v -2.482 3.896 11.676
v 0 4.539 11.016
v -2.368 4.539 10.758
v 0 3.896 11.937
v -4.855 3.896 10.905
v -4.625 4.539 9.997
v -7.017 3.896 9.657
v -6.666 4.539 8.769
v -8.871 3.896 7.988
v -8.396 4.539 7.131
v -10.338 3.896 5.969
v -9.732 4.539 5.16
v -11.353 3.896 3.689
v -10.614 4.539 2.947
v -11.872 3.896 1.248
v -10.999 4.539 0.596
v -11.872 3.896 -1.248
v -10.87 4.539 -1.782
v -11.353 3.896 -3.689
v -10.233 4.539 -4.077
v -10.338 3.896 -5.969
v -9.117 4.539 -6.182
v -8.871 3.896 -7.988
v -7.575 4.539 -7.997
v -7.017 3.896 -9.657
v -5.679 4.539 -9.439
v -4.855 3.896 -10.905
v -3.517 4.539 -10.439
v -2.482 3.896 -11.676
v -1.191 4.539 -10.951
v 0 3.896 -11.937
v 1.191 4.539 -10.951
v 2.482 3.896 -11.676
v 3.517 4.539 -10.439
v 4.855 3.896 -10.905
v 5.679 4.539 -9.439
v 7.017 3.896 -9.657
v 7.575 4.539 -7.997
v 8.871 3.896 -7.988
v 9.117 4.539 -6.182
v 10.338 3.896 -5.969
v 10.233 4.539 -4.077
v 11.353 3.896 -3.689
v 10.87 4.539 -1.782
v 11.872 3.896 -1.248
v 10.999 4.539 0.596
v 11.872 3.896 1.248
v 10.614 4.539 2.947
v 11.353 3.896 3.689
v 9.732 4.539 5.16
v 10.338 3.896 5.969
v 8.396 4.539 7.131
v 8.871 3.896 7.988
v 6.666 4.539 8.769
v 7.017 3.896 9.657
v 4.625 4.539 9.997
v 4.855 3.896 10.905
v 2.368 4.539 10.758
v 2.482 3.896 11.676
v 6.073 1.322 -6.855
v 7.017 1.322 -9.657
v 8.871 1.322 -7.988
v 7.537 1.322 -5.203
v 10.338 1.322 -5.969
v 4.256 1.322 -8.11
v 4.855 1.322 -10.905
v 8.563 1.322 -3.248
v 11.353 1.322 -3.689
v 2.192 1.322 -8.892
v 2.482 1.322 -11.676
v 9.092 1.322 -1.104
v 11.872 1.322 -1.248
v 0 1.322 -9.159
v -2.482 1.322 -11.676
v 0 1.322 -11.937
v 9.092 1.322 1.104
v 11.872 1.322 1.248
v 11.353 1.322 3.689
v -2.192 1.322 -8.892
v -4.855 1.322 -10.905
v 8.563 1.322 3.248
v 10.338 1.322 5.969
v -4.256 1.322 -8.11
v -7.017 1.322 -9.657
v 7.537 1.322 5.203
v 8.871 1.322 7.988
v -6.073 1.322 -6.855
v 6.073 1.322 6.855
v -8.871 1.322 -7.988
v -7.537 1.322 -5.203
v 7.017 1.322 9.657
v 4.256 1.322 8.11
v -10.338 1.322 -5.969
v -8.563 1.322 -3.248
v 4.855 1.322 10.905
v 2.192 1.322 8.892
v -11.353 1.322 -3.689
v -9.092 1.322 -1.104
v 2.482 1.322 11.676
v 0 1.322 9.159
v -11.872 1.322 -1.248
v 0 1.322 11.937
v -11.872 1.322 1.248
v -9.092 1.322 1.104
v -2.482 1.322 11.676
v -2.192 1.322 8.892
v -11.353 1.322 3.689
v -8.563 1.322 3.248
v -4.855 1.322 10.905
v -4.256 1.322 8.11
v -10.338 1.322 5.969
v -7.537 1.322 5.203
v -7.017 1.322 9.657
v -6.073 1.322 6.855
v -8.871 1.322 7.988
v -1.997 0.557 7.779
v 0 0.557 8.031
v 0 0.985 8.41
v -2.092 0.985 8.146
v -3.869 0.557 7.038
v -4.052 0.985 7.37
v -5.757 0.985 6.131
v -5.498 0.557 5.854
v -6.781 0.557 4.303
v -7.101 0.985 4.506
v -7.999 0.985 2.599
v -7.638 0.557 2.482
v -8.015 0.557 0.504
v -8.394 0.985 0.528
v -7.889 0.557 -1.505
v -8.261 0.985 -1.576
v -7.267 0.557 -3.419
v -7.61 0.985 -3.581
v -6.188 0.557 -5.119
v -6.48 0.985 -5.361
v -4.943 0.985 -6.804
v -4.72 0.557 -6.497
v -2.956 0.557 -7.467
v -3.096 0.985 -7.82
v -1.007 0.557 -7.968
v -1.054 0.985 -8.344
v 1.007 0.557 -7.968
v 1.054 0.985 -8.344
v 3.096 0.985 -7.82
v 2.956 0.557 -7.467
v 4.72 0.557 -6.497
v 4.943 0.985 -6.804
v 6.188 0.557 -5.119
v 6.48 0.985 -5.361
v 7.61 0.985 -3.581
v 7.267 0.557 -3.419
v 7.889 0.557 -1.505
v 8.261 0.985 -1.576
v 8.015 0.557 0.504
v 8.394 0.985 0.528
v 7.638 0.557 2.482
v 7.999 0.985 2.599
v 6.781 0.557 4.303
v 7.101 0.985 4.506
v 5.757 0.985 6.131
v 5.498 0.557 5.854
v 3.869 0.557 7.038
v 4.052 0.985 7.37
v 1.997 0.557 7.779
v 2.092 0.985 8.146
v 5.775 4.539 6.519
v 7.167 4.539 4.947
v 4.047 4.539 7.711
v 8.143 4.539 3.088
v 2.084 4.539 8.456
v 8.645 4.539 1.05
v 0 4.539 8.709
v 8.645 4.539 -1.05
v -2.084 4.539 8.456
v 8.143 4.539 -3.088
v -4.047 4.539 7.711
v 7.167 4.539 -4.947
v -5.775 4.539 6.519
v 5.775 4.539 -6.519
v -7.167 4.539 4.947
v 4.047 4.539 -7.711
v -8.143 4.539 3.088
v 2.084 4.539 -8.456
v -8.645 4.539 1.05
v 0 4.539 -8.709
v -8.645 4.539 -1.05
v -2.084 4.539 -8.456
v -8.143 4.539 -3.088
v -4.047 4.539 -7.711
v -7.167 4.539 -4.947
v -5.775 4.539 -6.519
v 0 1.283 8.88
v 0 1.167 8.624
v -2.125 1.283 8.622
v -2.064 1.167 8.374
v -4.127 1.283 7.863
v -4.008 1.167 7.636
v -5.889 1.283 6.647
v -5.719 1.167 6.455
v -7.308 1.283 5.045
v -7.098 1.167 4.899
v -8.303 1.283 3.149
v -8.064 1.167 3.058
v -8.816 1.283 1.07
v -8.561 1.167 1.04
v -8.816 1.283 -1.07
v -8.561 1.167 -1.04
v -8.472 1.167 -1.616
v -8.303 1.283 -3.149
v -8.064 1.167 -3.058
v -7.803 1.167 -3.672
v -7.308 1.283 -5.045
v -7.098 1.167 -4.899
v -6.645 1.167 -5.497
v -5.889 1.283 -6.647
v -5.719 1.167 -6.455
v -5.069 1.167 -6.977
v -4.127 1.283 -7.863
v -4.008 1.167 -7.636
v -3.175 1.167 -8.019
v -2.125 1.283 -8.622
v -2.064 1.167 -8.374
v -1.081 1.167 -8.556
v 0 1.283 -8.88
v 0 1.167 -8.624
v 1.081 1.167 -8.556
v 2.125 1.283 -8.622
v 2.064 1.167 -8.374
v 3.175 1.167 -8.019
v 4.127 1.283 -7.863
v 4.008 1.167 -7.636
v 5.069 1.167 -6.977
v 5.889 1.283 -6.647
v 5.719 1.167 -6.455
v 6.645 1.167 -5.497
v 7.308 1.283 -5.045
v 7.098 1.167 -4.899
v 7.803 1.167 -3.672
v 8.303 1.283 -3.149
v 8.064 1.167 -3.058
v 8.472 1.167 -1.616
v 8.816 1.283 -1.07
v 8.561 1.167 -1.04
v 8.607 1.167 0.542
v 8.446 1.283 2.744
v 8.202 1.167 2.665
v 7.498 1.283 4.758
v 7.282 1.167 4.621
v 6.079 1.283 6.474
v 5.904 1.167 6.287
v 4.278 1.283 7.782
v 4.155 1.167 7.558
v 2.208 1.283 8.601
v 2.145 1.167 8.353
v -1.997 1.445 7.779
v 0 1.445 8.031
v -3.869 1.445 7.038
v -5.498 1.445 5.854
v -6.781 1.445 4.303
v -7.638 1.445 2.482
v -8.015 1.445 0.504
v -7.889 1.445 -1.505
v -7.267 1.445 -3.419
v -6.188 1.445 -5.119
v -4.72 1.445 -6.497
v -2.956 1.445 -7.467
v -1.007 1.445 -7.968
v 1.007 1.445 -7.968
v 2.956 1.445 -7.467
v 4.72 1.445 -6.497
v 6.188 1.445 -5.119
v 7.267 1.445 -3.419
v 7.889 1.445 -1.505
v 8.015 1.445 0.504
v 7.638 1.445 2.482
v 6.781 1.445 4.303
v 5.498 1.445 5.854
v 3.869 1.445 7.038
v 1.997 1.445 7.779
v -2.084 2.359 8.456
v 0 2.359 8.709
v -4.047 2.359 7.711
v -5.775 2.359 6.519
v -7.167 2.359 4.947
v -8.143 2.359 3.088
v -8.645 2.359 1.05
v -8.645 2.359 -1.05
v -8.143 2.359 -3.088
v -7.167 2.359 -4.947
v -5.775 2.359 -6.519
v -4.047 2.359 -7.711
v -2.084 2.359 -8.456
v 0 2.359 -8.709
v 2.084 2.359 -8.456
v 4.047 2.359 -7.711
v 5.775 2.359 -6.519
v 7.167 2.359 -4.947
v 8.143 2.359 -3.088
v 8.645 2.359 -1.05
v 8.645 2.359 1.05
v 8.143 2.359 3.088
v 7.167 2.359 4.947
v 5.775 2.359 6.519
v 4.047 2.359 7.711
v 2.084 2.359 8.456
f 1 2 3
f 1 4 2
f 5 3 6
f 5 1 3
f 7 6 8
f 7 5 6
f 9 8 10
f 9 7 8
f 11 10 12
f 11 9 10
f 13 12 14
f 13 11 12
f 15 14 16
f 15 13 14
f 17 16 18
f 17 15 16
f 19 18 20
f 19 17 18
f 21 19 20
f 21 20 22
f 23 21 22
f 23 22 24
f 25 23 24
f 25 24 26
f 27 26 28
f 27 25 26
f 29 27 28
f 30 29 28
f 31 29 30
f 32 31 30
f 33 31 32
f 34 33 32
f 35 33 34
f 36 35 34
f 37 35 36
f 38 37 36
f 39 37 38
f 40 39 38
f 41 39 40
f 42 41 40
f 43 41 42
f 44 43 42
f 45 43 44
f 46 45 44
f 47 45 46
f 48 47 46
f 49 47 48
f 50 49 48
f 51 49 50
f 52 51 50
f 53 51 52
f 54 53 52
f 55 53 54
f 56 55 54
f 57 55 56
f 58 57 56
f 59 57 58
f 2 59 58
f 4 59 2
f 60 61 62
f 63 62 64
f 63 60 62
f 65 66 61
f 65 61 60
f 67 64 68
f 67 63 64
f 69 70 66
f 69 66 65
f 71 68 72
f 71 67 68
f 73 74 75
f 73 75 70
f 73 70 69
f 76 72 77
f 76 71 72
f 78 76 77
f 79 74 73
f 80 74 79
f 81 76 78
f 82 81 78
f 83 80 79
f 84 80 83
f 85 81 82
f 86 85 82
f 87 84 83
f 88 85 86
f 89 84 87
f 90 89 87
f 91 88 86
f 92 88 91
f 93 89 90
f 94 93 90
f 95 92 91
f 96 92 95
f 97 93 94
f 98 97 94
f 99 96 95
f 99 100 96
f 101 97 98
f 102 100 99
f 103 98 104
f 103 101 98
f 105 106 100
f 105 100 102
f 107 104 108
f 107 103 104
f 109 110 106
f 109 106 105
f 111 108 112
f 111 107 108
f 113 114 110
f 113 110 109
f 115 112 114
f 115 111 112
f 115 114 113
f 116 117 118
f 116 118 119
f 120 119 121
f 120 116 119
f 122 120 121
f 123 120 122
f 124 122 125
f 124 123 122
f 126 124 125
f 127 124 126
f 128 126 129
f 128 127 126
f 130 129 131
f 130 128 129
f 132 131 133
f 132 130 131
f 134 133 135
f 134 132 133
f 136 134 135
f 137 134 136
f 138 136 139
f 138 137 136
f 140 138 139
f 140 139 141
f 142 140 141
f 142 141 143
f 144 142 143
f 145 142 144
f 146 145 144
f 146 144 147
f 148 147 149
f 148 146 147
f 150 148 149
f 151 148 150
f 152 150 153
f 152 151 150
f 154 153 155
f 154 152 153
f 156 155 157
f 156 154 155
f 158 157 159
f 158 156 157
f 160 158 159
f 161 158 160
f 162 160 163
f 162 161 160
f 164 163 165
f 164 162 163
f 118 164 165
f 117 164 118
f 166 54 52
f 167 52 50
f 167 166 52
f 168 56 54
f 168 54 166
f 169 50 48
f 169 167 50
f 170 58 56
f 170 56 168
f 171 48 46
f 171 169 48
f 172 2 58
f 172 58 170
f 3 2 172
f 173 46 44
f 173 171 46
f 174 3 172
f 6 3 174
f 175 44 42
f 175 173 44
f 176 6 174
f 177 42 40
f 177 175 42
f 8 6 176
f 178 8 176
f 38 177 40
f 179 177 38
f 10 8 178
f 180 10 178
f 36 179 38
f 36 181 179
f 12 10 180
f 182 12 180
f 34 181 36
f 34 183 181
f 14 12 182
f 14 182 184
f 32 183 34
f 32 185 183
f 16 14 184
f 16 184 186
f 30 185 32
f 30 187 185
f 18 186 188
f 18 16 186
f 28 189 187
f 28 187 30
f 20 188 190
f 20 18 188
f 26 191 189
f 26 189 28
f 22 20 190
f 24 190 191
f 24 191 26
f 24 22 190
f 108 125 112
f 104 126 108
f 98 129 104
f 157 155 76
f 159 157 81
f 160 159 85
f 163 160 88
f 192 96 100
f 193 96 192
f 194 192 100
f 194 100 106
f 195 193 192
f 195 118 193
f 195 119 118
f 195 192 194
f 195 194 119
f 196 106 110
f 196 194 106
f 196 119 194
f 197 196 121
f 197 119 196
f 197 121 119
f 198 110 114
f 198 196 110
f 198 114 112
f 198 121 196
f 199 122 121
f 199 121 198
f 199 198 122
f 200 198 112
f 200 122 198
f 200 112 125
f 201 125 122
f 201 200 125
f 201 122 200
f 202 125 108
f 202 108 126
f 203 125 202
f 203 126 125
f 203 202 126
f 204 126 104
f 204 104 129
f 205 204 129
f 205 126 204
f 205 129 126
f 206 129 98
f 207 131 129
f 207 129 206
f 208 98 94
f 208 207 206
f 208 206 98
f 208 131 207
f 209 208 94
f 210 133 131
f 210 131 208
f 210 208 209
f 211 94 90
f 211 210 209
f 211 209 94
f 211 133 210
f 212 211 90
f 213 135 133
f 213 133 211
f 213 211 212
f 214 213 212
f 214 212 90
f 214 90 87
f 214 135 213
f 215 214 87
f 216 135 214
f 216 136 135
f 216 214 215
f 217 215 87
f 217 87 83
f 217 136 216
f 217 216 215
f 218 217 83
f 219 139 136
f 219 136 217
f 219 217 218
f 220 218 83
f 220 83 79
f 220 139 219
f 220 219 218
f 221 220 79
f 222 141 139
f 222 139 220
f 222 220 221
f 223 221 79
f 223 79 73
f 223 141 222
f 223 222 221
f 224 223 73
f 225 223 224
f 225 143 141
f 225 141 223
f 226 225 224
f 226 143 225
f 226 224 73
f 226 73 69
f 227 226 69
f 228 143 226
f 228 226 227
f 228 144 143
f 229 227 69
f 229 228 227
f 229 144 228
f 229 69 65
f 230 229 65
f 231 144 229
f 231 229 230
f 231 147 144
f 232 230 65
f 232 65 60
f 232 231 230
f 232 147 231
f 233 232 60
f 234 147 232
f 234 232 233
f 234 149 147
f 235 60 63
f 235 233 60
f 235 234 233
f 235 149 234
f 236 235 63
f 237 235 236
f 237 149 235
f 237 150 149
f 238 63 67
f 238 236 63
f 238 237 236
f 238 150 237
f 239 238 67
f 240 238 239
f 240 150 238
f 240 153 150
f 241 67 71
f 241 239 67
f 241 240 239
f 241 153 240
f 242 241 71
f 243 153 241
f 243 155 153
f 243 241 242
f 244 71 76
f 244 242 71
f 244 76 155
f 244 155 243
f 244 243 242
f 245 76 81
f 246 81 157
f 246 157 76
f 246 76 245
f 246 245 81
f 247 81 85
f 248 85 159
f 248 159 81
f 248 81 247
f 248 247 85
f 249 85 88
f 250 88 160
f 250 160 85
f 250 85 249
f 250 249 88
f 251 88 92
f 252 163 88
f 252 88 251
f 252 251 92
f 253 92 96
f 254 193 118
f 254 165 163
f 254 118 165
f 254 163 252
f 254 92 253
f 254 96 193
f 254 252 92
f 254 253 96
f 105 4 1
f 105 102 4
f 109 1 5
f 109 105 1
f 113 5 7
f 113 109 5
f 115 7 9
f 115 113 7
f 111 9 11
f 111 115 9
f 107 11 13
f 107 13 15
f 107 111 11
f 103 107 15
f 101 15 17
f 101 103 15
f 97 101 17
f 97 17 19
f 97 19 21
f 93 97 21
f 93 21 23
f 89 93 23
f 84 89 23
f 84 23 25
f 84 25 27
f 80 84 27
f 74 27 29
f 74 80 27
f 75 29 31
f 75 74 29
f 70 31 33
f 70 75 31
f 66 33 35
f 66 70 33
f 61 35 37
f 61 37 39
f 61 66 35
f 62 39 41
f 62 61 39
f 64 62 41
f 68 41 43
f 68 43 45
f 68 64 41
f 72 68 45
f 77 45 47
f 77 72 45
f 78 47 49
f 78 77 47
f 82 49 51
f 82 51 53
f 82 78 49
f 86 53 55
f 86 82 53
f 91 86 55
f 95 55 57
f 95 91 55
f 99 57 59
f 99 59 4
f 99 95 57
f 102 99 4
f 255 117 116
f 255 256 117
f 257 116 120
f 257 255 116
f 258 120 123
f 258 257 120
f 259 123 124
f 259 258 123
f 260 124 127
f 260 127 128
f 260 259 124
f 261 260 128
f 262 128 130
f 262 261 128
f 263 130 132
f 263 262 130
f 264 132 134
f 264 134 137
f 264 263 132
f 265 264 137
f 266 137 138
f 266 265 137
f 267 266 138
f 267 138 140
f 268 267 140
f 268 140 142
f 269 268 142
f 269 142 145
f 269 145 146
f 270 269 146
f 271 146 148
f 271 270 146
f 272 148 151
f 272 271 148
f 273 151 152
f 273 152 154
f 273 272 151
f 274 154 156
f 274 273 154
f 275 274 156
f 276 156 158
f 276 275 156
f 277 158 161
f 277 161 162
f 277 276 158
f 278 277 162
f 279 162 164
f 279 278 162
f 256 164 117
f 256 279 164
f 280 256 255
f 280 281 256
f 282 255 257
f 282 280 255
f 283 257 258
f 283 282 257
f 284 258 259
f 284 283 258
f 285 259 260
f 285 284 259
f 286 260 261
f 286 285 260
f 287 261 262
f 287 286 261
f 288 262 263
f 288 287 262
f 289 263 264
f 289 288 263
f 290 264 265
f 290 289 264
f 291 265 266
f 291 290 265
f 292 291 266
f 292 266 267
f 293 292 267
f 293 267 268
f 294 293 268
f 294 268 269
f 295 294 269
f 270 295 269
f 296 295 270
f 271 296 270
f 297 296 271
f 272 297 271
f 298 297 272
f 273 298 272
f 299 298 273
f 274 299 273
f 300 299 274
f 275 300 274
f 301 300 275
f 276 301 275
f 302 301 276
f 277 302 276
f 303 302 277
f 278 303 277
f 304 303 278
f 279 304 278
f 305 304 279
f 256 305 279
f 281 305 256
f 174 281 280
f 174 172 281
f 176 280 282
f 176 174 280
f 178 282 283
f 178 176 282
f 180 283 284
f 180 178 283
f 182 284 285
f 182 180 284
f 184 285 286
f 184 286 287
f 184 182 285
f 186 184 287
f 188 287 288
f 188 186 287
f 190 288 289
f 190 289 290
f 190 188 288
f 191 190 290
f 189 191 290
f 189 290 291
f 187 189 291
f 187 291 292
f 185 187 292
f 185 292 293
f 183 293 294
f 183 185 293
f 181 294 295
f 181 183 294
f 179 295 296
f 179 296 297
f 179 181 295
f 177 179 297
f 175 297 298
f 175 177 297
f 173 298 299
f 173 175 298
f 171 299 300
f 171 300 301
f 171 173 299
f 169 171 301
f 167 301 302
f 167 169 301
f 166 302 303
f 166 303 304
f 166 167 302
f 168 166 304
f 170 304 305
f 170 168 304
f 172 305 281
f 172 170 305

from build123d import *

# Parameters (mm, degrees)
REDONDEO1_R = 1


with BuildPart() as part:
    # Croquis1 → Revolución1 (revolve)
    with BuildSketch(Plane.XY, mode=Mode.PRIVATE) as revoluci_n1_sk:
        Polygon((-8.030896413, 0.557253855), (-8.030896413, 1.445392264), (-8.708681637, 2.358698791), (-8.708681637, 4.539307424), (-11.015589151, 4.539307424), (-11.937259367, 3.895637734), (-11.937259367, 1.322020013), (-8.708681637, 1.322020013), align=None)
    revolve(revoluci_n1_sk.sketch.rotate(Axis((0, 26.098695966, 0), (0, -1, 0)), 270), axis=Axis((0, 26.098695966, 0), (0, -1, 0)))

    # Redondeo1
    redondeo1_edges = [part.edges().sort_by_distance(p)[0] for p in [
        (0, 1.322020013, -8.708681637),
    ]]
    fillet(redondeo1_edges, radius=REDONDEO1_R)


solid = part.part
